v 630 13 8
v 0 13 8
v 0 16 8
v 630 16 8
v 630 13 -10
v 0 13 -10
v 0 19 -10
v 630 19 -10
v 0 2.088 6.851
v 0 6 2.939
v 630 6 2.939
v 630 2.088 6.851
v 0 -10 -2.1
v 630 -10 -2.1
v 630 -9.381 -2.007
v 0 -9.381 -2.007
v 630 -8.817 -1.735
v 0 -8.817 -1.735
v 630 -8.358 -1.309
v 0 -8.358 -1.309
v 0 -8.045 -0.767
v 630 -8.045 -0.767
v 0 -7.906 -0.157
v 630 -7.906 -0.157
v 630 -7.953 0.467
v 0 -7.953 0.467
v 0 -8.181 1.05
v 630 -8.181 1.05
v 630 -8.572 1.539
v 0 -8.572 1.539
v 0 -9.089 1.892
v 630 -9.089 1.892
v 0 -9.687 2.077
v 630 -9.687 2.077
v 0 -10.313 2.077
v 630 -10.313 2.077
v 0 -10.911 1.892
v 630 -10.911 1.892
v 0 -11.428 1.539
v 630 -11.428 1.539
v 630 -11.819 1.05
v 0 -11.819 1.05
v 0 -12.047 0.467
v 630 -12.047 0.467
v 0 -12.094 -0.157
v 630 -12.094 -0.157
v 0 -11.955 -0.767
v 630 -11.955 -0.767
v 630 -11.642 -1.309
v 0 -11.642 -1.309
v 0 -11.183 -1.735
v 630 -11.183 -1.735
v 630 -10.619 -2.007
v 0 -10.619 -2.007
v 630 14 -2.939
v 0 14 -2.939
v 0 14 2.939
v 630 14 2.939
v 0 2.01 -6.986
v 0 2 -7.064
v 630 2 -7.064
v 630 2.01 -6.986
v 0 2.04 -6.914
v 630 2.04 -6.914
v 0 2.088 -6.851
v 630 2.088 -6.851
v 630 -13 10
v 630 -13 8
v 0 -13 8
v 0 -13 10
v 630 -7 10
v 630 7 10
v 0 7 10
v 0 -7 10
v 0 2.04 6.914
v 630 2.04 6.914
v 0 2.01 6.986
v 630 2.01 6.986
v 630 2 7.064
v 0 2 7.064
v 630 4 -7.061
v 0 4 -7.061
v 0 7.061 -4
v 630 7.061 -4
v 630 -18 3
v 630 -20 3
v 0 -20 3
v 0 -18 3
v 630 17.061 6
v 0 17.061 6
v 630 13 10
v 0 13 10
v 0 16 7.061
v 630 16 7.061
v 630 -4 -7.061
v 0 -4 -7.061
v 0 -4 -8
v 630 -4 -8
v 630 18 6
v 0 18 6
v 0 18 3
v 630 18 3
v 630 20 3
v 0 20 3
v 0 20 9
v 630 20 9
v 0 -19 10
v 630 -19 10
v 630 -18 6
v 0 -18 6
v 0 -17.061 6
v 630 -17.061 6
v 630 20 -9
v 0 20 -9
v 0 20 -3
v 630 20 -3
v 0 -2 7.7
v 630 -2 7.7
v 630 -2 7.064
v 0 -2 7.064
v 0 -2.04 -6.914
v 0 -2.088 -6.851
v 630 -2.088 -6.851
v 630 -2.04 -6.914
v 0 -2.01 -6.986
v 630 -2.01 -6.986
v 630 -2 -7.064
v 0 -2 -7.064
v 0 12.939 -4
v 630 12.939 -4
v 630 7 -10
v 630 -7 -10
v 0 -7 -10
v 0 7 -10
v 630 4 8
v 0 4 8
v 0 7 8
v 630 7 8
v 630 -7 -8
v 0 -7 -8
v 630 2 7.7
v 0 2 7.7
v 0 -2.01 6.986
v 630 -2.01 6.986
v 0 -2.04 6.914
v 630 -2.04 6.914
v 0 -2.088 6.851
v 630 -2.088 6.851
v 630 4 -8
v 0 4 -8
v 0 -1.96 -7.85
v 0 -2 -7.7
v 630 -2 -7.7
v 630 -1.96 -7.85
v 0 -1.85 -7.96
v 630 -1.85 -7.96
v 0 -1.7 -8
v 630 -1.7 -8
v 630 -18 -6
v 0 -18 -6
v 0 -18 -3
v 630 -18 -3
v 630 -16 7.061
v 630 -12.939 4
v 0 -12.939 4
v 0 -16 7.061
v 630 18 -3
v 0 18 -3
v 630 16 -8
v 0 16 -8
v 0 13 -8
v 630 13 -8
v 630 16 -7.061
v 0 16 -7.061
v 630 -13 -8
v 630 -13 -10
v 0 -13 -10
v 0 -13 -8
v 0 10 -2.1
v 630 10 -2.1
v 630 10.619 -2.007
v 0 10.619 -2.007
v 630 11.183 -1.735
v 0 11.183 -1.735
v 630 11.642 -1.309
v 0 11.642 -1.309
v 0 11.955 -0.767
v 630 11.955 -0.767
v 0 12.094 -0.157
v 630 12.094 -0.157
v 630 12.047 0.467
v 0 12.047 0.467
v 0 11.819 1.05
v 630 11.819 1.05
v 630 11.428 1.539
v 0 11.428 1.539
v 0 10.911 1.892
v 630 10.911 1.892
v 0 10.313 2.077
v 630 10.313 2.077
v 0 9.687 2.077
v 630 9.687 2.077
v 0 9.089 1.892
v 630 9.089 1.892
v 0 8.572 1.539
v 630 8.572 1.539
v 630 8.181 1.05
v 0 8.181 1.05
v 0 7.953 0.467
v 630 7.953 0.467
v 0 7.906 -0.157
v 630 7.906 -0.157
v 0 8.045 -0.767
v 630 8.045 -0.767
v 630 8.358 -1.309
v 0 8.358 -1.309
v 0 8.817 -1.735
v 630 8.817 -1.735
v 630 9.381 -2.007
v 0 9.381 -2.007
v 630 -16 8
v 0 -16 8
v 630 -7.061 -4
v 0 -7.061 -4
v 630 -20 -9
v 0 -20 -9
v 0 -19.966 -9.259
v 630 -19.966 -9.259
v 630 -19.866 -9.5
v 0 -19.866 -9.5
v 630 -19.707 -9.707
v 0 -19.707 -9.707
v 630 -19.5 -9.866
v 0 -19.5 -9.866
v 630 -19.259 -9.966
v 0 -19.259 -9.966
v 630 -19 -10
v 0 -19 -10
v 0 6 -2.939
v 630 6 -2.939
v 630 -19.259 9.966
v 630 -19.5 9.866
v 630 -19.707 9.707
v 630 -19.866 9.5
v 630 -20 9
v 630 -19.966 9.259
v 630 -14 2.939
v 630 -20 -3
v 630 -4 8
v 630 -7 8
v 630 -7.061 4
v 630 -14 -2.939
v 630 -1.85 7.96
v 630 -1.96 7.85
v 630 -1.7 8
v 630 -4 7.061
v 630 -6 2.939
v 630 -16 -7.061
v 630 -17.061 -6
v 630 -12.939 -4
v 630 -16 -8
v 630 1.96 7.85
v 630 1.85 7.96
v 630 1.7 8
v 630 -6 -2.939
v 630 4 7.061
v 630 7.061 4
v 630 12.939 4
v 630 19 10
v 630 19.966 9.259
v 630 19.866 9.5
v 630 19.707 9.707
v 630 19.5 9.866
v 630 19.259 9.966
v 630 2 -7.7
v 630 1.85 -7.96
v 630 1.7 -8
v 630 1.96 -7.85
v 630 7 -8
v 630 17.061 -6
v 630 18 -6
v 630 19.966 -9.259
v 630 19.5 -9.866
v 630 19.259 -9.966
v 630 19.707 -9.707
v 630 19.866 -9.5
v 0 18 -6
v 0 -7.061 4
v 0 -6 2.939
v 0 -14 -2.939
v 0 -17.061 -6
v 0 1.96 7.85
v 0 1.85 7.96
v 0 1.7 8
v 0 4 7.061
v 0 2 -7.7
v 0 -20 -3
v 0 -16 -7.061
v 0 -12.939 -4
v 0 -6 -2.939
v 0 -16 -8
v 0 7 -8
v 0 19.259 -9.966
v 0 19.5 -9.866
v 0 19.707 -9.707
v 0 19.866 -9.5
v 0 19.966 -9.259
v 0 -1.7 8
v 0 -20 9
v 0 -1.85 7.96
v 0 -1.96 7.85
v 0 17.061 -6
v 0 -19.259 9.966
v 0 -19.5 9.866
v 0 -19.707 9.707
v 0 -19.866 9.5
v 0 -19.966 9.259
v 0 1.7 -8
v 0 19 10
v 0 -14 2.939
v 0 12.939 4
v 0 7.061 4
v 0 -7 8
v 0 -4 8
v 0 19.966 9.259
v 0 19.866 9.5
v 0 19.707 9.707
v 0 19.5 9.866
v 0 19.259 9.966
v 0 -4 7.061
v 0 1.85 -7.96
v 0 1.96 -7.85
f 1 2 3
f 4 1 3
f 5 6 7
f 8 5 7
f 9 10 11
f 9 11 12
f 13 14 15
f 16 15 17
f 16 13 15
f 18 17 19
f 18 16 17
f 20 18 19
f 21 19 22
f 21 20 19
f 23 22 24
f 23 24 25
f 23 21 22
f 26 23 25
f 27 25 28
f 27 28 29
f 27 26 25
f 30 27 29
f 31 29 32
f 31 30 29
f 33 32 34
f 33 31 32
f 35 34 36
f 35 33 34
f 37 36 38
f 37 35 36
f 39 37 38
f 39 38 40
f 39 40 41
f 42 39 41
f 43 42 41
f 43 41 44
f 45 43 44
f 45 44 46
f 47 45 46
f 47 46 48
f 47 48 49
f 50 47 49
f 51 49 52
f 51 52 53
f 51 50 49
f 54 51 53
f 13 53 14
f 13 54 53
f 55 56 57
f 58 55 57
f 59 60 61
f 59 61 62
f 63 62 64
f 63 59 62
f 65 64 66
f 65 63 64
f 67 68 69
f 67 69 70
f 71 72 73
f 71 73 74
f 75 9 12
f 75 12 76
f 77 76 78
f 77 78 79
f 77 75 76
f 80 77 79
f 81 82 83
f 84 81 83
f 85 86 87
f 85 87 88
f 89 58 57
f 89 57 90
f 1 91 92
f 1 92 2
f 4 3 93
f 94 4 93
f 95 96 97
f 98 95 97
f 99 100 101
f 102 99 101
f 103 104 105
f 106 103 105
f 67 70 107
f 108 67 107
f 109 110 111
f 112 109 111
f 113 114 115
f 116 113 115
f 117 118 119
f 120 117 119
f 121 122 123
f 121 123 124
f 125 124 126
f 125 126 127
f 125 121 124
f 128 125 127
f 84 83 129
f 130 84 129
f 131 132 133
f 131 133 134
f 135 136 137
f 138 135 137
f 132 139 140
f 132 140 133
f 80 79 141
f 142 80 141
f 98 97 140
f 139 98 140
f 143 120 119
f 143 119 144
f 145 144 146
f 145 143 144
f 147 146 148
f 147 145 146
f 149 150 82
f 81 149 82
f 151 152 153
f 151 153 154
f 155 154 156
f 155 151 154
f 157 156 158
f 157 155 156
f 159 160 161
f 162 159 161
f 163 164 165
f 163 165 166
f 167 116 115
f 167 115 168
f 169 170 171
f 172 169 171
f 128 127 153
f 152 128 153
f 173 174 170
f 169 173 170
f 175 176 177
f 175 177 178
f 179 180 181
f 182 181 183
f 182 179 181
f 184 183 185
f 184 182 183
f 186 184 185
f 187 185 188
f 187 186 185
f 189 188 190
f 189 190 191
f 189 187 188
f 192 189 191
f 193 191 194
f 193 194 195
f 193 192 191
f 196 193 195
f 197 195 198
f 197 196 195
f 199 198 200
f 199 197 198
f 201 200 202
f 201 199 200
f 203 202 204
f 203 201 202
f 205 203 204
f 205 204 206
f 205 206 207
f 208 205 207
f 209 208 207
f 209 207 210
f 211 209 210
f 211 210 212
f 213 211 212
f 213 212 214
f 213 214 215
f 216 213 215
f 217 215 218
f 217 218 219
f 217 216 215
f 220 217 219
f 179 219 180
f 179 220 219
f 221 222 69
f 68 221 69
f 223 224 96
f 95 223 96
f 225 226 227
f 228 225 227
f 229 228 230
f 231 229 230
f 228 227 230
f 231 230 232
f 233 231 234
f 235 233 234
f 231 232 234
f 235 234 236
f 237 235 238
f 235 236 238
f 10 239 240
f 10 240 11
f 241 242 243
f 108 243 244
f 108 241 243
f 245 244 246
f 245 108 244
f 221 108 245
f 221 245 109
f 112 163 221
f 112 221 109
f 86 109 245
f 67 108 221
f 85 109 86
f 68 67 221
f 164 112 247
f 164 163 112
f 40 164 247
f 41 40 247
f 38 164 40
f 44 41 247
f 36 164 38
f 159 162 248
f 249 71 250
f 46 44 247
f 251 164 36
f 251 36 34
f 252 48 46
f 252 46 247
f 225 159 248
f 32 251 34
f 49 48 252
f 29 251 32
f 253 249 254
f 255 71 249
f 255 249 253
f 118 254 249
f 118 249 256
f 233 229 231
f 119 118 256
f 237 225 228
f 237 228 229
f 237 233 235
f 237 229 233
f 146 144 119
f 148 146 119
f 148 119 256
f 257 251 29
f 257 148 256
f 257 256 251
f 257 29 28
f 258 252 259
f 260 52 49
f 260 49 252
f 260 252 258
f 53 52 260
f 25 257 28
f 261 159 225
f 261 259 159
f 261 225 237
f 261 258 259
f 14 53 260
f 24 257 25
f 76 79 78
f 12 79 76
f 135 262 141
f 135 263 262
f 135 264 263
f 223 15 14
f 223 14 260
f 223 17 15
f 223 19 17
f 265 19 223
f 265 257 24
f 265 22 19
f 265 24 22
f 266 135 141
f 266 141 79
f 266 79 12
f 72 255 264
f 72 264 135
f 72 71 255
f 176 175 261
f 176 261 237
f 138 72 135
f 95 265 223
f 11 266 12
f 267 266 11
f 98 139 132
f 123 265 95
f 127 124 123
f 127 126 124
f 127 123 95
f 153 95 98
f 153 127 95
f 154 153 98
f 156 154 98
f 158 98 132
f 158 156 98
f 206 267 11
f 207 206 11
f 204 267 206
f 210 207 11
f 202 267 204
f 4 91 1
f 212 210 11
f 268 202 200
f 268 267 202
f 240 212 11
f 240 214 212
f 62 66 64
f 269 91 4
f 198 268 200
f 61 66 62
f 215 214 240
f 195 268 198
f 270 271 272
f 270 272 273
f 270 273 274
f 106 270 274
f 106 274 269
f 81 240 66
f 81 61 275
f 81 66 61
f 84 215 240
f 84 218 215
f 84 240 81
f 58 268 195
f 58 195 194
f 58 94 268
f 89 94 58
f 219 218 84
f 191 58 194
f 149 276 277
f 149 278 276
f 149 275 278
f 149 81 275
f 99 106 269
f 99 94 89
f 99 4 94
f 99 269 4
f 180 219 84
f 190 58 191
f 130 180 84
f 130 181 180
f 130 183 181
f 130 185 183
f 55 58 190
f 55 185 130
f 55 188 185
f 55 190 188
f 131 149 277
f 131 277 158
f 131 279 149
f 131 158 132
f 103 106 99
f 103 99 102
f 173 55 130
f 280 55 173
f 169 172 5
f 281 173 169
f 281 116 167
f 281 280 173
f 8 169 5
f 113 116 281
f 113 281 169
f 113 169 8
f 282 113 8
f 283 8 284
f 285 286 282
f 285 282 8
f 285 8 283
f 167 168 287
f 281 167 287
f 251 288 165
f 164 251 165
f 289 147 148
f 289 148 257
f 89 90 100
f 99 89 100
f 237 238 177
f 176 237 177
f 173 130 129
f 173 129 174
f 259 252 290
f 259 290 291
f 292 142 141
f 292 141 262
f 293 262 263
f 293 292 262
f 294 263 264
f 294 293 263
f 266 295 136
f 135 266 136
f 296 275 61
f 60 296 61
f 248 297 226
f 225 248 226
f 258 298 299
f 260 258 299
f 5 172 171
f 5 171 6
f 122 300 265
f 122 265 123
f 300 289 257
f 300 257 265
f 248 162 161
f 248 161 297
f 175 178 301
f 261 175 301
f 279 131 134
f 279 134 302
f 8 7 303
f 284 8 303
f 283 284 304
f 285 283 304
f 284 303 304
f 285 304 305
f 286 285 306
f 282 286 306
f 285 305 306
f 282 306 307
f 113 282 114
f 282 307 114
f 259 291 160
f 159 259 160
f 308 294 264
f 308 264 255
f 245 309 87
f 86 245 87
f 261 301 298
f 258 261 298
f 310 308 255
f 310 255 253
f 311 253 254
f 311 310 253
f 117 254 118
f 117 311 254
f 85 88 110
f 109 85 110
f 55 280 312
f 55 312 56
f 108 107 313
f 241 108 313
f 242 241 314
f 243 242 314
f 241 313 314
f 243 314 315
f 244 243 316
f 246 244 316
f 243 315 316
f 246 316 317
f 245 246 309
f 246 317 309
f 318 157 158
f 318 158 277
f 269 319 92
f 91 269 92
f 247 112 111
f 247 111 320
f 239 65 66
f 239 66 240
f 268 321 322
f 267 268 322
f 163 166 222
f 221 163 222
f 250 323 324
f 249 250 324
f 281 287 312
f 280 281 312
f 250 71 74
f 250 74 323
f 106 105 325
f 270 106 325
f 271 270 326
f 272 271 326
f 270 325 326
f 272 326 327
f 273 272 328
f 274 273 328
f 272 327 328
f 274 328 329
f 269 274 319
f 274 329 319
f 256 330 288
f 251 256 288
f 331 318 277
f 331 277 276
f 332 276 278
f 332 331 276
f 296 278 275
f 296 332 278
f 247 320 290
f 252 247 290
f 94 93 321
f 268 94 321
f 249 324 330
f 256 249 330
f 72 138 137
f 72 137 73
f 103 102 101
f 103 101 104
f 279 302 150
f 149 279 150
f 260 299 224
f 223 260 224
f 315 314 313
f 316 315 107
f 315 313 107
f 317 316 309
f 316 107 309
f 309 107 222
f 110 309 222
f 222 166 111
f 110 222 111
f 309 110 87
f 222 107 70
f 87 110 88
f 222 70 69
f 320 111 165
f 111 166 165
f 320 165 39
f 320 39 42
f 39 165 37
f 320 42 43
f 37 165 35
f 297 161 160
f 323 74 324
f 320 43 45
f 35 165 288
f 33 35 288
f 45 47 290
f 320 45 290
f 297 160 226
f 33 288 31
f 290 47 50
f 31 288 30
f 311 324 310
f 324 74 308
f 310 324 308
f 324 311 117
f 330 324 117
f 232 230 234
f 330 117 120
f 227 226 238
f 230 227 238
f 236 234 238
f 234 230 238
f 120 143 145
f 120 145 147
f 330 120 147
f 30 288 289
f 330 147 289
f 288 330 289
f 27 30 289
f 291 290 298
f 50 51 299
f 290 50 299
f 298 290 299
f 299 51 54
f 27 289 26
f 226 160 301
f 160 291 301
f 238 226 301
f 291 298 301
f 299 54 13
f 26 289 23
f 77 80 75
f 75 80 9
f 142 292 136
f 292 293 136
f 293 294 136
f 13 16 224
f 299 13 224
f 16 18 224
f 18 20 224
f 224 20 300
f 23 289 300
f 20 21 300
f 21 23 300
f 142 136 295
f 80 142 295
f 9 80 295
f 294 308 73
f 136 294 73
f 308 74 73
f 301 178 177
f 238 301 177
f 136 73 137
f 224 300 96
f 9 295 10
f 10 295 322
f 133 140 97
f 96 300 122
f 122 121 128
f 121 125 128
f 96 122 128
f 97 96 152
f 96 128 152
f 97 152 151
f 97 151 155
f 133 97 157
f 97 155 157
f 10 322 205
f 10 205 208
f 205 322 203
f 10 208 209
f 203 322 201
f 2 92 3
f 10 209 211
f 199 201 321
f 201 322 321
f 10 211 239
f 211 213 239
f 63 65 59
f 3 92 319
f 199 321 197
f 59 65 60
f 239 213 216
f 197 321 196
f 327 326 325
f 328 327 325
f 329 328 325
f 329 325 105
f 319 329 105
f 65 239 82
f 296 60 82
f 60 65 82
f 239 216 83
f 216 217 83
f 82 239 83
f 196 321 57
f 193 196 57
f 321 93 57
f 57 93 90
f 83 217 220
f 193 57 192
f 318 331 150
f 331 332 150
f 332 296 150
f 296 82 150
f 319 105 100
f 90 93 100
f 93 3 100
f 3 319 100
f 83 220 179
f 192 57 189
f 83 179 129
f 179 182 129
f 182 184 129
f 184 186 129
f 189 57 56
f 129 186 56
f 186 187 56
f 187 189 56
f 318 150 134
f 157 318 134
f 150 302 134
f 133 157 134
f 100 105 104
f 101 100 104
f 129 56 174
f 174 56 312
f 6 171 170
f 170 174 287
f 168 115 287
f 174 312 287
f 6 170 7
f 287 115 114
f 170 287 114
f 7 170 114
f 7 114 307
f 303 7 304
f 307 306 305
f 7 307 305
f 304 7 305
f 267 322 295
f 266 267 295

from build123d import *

# Parameters (mm, degrees)
SKETCH1_R           = 2.1
BOSS_EXTRUDE1_DEPTH = 630


with BuildPart() as part:
    # Sketch1 → Boss-Extrude1 (new body)
    with BuildSketch(Plane(origin=(0, 0, 0), x_dir=(0, 0, -1), z_dir=(1, 0, 0))):
        with BuildLine():
            Line((-10, -13), (-10, -19))
            ThreePointArc((-10, -19), (-9.707106781, -19.707106781), (-9, -20))
            Line((-9, -20), (-3, -20))
            Line((-3, -20), (-3, -18))
            Line((-3, -18), (-6, -18))
            Line((-6, -18), (-6, -17.060660172))
            Line((-6, -17.060660172), (-2.939339828, -14))
            Line((-2.939339828, -14), (2.939339828, -14))
            Line((2.939339828, -14), (6, -17.060660172))
            Line((6, -17.060660172), (6, -18))
            Line((6, -18), (3, -18))
            Line((3, -18), (3, -20))
            Line((3, -20), (9, -20))
            ThreePointArc((9, -20), (9.707106781, -19.707106781), (10, -19))
            Line((10, -19), (10, -13))
            Line((10, -13), (8, -13))
            Line((8, -13), (8, -16))
            Line((8, -16), (7.060660172, -16))
            Line((7.060660172, -16), (4, -12.939339828))
            Line((4, -12.939339828), (4, -7.060660172))
            Line((4, -7.060660172), (7.060660172, -4))
            Line((7.060660172, -4), (8, -4))
            Line((8, -4), (8, -7))
            Line((8, -7), (10, -7))
            Line((10, -7), (10, 7))
            Line((10, 7), (8, 7))
            Line((8, 7), (8, 4))
            Line((8, 4), (7.060660172, 4))
            Line((7.060660172, 4), (4, 7.060660172))
            Line((4, 7.060660172), (4, 12.939339828))
            Line((4, 12.939339828), (7.060660172, 16))
            Line((7.060660172, 16), (8, 16))
            Line((8, 16), (8, 13))
            Line((8, 13), (10, 13))
            Line((10, 13), (10, 19))
            ThreePointArc((10, 19), (9.707106781, 19.707106781), (9, 20))
            Line((9, 20), (3, 20))
            Line((3, 20), (3, 18))
            Line((3, 18), (6, 18))
            Line((6, 18), (6, 17.060660172))
            Line((6, 17.060660172), (2.939339828, 14))
            Line((2.939339828, 14), (-2.939339828, 14))
            Line((-2.939339828, 14), (-6, 17.060660172))
            Line((-6, 17.060660172), (-6, 18))
            Line((-6, 18), (-3, 18))
            Line((-3, 18), (-3, 20))
            Line((-3, 20), (-9, 20))
            ThreePointArc((-9, 20), (-9.707106781, 19.707106781), (-10, 19))
            Line((-10, 19), (-10, 13))
            Line((-10, 13), (-8, 13))
            Line((-8, 13), (-8, 16))
            Line((-8, 16), (-7.060660172, 16))
            Line((-7.060660172, 16), (-4, 12.939339828))
            Line((-4, 12.939339828), (-4, 7.060660172))
            Line((-4, 7.060660172), (-7.060660172, 4))
            Line((-7.060660172, 4), (-8, 4))
            Line((-8, 4), (-8, 7))
            Line((-8, 7), (-10, 7))
            Line((-10, 7), (-10, -7))
            Line((-10, -7), (-8, -7))
            Line((-8, -7), (-8, -4))
            Line((-8, -4), (-7.060660172, -4))
            Line((-7.060660172, -4), (-4, -7.060660172))
            Line((-4, -7.060660172), (-4, -12.939339828))
            Line((-4, -12.939339828), (-7.060660172, -16))
            Line((-7.060660172, -16), (-8, -16))
            Line((-8, -16), (-8, -13))
            Line((-8, -13), (-10, -13))
        make_face()
        with Locations((0, 10)):
            Circle(SKETCH1_R, mode=Mode.SUBTRACT)
        with Locations((0, -10)):
            Circle(SKETCH1_R, mode=Mode.SUBTRACT)
        with BuildLine():
            Line((-8, 1.7), (-8, -1.7))
            ThreePointArc((-8, -1.7), (-7.912132034, -1.912132034), (-7.7, -2))
            Line((-7.7, -2), (-7.063603897, -2))
            ThreePointArc((-7.063603897, -2), (-6.948798867, -2.02283614), (-6.851471863, -2.087867966))
            Line((-6.851471863, -2.087867966), (-2.939339828, -6))
            Line((-2.939339828, -6), (2.939339828, -6))
            Line((2.939339828, -6), (6.851471863, -2.087867966))
            ThreePointArc((6.851471863, -2.087867966), (6.948798867, -2.02283614), (7.063603897, -2))
            Line((7.063603897, -2), (7.7, -2))
            ThreePointArc((7.7, -2), (7.912132034, -1.912132034), (8, -1.7))
            Line((8, -1.7), (8, 1.7))
            ThreePointArc((8, 1.7), (7.912132034, 1.912132034), (7.7, 2))
            Line((7.7, 2), (7.063603897, 2))
            ThreePointArc((7.063603897, 2), (6.948798867, 2.02283614), (6.851471863, 2.087867966))
            Line((6.851471863, 2.087867966), (2.939339828, 6))
            Line((2.939339828, 6), (-2.939339828, 6))
            Line((-2.939339828, 6), (-6.851471863, 2.087867966))
            ThreePointArc((-6.851471863, 2.087867966), (-6.948798867, 2.02283614), (-7.063603897, 2))
            Line((-7.063603897, 2), (-7.7, 2))
            ThreePointArc((-7.7, 2), (-7.912132034, 1.912132034), (-8, 1.7))
        make_face(mode=Mode.SUBTRACT)
    extrude(amount=BOSS_EXTRUDE1_DEPTH)


solid = part.part
